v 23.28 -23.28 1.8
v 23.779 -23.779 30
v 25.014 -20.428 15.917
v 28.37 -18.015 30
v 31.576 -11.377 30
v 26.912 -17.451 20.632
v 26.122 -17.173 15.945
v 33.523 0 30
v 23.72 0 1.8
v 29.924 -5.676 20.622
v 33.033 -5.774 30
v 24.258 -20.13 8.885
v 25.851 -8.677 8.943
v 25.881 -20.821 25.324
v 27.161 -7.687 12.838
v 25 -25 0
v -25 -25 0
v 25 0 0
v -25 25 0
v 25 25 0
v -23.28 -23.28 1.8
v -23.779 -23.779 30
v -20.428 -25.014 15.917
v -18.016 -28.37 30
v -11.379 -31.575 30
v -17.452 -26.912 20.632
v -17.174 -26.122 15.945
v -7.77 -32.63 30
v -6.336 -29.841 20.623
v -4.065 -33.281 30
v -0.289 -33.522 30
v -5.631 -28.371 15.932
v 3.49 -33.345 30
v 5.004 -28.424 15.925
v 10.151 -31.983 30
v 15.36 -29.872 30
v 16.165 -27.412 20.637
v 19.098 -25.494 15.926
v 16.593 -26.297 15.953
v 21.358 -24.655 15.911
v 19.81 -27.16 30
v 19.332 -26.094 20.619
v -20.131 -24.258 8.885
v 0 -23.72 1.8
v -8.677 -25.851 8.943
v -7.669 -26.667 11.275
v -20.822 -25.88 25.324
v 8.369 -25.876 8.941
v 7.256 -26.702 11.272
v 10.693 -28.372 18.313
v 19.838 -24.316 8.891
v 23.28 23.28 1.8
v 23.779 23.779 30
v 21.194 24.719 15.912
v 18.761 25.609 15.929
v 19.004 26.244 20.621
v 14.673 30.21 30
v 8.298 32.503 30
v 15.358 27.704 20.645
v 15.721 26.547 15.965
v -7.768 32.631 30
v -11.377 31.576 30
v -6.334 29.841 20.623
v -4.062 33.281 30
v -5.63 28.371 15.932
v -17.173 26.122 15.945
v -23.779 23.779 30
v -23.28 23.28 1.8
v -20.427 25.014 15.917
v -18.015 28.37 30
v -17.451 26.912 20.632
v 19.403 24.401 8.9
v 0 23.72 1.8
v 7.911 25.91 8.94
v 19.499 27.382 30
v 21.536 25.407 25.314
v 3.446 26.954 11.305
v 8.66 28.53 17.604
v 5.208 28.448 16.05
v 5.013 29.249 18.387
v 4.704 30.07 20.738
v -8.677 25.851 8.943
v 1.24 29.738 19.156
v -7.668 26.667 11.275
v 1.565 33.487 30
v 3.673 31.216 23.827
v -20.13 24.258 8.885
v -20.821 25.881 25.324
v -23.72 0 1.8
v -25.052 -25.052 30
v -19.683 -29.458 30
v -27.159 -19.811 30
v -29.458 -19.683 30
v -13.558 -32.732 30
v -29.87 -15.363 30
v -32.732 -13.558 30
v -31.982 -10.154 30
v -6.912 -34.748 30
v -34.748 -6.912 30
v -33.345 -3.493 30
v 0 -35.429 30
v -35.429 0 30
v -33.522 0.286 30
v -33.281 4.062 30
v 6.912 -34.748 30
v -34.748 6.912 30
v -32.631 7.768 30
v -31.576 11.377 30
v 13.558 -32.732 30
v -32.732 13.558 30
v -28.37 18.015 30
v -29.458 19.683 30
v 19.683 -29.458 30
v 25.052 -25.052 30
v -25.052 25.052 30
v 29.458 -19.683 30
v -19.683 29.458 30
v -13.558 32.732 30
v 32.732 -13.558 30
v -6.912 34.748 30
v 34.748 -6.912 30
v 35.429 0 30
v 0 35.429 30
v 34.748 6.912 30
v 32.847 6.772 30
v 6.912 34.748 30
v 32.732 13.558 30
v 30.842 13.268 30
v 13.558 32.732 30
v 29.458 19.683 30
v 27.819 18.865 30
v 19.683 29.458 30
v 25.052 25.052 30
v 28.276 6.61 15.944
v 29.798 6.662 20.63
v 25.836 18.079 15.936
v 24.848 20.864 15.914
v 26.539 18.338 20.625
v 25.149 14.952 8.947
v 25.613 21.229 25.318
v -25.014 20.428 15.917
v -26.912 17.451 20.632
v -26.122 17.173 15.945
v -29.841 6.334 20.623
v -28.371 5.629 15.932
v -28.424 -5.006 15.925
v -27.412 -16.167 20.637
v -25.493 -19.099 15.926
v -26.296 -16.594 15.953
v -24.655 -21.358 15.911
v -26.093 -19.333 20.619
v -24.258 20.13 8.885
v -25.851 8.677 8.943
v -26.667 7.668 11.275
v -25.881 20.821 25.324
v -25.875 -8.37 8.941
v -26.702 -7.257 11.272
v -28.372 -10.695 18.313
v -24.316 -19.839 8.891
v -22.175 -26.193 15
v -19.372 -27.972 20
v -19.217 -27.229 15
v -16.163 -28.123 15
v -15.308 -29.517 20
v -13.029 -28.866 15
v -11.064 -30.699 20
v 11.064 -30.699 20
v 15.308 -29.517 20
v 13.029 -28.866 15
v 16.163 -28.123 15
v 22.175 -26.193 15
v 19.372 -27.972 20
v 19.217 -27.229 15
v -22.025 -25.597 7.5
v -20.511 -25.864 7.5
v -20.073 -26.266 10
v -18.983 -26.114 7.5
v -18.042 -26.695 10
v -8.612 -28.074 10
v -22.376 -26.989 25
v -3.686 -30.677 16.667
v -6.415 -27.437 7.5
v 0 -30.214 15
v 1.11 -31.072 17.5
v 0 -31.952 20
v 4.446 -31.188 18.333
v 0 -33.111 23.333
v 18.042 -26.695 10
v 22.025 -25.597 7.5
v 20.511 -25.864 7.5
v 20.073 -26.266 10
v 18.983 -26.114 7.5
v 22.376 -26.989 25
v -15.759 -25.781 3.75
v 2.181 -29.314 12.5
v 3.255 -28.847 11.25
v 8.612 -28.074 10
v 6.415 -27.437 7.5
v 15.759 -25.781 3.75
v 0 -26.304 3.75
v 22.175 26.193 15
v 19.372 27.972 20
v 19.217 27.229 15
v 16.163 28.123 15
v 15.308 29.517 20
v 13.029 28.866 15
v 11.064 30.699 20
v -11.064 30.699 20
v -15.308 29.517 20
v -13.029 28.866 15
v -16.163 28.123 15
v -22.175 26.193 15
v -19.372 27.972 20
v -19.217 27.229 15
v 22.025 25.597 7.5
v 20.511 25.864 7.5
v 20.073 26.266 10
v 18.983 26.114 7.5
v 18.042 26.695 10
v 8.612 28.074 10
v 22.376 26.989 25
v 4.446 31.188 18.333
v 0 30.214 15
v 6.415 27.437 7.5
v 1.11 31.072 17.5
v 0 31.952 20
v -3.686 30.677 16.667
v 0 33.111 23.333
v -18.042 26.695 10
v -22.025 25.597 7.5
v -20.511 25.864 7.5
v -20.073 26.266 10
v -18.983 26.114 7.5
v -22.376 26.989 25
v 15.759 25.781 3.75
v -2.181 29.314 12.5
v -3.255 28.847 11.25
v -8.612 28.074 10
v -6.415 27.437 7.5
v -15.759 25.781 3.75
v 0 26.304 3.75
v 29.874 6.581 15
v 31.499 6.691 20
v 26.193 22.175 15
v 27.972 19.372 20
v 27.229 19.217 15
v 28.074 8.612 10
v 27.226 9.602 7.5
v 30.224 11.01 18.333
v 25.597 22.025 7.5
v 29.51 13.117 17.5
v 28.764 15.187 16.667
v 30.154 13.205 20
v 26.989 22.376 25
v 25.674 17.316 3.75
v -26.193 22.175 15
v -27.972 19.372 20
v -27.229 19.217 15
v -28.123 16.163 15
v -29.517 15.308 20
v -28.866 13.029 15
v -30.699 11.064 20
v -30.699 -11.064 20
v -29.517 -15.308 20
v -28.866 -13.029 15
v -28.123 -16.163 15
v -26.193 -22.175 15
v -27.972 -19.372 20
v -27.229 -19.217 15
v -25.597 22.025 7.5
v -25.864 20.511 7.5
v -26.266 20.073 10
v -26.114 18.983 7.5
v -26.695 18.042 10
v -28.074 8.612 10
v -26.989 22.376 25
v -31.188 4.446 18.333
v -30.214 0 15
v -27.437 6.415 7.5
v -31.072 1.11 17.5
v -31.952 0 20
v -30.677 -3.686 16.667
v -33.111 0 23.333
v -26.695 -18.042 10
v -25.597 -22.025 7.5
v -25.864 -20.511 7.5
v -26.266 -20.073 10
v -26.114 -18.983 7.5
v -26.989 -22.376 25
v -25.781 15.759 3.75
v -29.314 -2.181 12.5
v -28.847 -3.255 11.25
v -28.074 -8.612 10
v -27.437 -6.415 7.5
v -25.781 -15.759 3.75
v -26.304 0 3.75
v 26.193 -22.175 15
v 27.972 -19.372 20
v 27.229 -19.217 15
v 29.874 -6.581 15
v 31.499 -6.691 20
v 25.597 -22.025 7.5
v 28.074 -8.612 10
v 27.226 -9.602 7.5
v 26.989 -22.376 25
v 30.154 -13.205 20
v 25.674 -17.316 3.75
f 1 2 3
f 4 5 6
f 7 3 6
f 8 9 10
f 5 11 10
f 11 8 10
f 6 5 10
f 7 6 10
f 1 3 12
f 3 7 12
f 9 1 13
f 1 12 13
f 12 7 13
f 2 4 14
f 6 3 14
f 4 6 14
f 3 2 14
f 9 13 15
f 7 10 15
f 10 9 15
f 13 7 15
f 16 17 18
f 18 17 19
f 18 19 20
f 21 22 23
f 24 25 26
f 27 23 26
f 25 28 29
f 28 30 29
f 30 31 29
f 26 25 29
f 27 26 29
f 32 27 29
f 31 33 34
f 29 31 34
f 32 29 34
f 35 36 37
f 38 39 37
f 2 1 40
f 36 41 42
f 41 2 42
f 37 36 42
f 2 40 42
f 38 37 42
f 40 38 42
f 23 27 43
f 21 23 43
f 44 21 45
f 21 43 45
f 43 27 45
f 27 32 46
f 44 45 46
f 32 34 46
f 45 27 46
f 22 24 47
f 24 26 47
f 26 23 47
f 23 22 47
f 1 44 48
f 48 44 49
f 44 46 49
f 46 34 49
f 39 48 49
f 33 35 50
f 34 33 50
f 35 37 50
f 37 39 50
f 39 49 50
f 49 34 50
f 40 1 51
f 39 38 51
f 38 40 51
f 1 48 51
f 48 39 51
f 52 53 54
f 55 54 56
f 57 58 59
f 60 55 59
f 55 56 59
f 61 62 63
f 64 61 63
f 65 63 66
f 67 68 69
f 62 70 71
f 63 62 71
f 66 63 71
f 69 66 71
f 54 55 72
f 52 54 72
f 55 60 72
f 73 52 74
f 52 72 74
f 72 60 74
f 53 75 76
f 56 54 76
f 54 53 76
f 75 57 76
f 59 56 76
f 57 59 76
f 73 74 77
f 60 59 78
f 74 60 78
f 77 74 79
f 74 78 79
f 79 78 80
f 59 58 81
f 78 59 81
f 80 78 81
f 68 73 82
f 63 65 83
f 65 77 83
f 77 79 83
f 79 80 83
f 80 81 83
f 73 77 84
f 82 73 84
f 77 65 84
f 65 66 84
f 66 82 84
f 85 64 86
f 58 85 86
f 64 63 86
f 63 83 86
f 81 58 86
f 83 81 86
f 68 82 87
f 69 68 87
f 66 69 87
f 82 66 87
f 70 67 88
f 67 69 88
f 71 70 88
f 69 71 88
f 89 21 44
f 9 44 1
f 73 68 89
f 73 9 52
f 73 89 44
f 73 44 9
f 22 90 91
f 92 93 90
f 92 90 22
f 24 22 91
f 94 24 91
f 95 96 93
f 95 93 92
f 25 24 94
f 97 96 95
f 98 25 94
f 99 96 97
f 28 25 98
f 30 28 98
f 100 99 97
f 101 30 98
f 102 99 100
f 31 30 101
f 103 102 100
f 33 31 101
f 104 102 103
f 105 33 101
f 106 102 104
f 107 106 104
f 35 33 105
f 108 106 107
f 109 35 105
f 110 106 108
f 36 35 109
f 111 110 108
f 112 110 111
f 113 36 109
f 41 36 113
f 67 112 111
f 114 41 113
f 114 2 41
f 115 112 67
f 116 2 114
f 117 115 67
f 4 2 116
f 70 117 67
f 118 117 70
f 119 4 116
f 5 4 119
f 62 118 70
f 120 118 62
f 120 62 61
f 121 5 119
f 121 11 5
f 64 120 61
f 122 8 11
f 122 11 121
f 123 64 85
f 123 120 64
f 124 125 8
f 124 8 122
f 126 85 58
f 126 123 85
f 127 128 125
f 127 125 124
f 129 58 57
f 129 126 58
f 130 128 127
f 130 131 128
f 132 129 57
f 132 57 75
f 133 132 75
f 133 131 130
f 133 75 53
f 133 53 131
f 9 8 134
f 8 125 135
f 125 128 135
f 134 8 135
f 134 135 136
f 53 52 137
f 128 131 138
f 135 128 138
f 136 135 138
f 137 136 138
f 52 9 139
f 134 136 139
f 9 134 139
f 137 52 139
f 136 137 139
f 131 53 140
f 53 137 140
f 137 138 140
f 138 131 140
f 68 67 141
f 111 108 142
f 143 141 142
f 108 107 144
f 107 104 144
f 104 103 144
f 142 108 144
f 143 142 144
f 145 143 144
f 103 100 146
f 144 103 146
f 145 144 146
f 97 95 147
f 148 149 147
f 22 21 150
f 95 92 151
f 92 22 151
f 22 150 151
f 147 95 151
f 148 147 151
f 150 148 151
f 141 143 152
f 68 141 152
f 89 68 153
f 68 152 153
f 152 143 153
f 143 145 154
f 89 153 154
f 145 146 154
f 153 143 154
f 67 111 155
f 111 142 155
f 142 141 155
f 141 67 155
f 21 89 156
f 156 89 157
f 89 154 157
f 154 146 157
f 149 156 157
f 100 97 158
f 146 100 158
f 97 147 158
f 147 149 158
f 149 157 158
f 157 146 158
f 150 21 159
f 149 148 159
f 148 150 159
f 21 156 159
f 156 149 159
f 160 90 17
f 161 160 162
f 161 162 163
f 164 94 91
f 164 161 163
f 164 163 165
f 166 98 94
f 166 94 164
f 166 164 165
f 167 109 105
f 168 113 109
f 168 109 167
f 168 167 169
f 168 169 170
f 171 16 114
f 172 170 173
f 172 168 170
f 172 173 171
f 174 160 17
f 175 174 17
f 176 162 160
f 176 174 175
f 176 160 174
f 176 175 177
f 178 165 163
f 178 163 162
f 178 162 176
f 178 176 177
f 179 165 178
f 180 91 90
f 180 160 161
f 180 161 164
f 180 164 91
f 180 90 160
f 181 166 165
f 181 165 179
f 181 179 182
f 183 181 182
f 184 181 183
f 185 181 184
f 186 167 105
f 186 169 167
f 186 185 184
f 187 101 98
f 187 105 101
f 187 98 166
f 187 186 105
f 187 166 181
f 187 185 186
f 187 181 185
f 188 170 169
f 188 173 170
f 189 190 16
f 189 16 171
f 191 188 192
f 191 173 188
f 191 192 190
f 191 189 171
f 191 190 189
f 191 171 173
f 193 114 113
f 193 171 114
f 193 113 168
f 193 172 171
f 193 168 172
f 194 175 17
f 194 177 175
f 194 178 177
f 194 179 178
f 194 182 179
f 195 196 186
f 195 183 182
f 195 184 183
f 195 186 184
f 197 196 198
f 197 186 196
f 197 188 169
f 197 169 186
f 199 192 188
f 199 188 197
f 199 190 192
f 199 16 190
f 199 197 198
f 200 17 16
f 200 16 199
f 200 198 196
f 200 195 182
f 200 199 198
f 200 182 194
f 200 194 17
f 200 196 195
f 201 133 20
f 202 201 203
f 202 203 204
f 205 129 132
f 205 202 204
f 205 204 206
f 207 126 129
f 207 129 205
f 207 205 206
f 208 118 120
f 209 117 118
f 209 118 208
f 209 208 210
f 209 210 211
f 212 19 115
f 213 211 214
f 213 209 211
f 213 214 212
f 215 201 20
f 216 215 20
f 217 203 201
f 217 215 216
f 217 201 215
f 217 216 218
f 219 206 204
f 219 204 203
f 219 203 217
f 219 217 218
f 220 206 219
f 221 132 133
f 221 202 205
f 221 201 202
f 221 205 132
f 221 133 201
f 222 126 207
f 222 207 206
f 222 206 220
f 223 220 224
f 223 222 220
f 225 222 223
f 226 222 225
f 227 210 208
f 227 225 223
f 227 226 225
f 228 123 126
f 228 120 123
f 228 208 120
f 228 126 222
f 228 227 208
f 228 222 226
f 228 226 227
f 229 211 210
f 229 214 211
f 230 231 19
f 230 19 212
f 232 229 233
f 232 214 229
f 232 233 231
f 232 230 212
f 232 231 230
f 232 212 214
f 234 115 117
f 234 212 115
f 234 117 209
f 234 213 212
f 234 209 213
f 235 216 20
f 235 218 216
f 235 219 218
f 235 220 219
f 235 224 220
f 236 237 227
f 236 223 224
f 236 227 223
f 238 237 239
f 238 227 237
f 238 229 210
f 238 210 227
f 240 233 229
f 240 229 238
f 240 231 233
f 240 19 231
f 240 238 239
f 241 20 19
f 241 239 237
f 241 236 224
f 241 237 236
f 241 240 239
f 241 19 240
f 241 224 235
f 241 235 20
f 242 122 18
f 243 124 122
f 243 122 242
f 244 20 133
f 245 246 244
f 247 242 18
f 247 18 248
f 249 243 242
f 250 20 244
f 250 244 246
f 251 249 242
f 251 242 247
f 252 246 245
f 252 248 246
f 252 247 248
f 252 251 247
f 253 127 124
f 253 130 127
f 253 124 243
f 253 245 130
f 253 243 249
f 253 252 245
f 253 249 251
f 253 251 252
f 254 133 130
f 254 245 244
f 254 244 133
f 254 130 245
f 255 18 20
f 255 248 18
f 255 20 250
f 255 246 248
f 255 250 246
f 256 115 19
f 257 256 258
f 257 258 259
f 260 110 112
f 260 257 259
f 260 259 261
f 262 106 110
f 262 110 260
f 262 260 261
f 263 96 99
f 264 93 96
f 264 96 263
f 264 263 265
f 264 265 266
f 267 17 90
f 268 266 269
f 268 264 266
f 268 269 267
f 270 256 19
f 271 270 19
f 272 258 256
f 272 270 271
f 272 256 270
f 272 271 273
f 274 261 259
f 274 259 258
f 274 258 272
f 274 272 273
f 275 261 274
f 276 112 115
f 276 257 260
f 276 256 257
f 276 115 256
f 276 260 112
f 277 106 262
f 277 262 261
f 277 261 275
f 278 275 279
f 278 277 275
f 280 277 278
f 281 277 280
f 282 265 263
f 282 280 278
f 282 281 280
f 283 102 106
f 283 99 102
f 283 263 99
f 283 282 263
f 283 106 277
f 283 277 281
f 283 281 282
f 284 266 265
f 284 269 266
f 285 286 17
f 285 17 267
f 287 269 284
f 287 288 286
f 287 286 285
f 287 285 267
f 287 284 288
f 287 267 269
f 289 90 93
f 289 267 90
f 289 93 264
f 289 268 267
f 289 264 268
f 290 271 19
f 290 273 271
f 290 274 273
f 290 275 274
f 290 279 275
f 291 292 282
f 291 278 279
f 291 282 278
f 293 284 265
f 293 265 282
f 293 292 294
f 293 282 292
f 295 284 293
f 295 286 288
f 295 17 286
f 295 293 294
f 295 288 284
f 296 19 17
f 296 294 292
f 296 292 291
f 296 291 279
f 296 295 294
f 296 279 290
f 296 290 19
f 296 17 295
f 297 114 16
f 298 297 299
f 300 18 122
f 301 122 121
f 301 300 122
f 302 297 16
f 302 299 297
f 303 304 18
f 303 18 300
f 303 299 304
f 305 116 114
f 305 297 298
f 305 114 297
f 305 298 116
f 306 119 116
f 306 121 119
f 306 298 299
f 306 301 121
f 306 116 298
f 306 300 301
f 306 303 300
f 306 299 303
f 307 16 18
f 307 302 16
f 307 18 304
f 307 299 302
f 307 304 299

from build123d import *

# Parameters (mm, degrees)
F0_W = 50
F0_H = 50
F2_R = 35.4285378843
F4_T = 1.8


# Not quite as in the source:
# - a shell that OpenCascade refuses in one call is made with other operations: the cavity is built on its own and cut out


with BuildPart() as f3:
    # F0 (on Top) → F3 section 0
    with BuildSketch(Plane.XY):
        Rectangle(F0_W, F0_H)
    # F2 (on offset) → F3 section 1
    with BuildSketch(Plane.XY.offset(30)):
        Circle(F2_R)
    loft()

    # F4: shell of thickness 1.8, made by hand


with BuildPart() as f4_core1:
    # F4_t2: copy of F3
    add(f3.part)

    # the walls: a layer under each face that stays
    f4_faces = [f4_core1.faces().sort_by_distance(p)[0] for p in [
        (0, 30.2142689408, 15),
        (-30.2142689408, 0, 15),
        (0, -30.2142689408, 15),
        (28.8658505055, -13.0289572392, 15),
        (28.8658505055, 13.0289572392, 15),
        (0, 0, 0),
    ]]
    thicken(f4_faces, amount=-F4_T, mode=Mode.SUBTRACT)


with BuildPart() as f3_1:
    add(f3.part)

    # what is left inside the walls is the cavity
    f4_cavity = [f4_core1.part.solids().sort_by_distance(p)[0] for p in [
        (0, -11.174295, 29.982),
    ]]
    add(f4_cavity, mode=Mode.SUBTRACT)


solid = f3_1.part
